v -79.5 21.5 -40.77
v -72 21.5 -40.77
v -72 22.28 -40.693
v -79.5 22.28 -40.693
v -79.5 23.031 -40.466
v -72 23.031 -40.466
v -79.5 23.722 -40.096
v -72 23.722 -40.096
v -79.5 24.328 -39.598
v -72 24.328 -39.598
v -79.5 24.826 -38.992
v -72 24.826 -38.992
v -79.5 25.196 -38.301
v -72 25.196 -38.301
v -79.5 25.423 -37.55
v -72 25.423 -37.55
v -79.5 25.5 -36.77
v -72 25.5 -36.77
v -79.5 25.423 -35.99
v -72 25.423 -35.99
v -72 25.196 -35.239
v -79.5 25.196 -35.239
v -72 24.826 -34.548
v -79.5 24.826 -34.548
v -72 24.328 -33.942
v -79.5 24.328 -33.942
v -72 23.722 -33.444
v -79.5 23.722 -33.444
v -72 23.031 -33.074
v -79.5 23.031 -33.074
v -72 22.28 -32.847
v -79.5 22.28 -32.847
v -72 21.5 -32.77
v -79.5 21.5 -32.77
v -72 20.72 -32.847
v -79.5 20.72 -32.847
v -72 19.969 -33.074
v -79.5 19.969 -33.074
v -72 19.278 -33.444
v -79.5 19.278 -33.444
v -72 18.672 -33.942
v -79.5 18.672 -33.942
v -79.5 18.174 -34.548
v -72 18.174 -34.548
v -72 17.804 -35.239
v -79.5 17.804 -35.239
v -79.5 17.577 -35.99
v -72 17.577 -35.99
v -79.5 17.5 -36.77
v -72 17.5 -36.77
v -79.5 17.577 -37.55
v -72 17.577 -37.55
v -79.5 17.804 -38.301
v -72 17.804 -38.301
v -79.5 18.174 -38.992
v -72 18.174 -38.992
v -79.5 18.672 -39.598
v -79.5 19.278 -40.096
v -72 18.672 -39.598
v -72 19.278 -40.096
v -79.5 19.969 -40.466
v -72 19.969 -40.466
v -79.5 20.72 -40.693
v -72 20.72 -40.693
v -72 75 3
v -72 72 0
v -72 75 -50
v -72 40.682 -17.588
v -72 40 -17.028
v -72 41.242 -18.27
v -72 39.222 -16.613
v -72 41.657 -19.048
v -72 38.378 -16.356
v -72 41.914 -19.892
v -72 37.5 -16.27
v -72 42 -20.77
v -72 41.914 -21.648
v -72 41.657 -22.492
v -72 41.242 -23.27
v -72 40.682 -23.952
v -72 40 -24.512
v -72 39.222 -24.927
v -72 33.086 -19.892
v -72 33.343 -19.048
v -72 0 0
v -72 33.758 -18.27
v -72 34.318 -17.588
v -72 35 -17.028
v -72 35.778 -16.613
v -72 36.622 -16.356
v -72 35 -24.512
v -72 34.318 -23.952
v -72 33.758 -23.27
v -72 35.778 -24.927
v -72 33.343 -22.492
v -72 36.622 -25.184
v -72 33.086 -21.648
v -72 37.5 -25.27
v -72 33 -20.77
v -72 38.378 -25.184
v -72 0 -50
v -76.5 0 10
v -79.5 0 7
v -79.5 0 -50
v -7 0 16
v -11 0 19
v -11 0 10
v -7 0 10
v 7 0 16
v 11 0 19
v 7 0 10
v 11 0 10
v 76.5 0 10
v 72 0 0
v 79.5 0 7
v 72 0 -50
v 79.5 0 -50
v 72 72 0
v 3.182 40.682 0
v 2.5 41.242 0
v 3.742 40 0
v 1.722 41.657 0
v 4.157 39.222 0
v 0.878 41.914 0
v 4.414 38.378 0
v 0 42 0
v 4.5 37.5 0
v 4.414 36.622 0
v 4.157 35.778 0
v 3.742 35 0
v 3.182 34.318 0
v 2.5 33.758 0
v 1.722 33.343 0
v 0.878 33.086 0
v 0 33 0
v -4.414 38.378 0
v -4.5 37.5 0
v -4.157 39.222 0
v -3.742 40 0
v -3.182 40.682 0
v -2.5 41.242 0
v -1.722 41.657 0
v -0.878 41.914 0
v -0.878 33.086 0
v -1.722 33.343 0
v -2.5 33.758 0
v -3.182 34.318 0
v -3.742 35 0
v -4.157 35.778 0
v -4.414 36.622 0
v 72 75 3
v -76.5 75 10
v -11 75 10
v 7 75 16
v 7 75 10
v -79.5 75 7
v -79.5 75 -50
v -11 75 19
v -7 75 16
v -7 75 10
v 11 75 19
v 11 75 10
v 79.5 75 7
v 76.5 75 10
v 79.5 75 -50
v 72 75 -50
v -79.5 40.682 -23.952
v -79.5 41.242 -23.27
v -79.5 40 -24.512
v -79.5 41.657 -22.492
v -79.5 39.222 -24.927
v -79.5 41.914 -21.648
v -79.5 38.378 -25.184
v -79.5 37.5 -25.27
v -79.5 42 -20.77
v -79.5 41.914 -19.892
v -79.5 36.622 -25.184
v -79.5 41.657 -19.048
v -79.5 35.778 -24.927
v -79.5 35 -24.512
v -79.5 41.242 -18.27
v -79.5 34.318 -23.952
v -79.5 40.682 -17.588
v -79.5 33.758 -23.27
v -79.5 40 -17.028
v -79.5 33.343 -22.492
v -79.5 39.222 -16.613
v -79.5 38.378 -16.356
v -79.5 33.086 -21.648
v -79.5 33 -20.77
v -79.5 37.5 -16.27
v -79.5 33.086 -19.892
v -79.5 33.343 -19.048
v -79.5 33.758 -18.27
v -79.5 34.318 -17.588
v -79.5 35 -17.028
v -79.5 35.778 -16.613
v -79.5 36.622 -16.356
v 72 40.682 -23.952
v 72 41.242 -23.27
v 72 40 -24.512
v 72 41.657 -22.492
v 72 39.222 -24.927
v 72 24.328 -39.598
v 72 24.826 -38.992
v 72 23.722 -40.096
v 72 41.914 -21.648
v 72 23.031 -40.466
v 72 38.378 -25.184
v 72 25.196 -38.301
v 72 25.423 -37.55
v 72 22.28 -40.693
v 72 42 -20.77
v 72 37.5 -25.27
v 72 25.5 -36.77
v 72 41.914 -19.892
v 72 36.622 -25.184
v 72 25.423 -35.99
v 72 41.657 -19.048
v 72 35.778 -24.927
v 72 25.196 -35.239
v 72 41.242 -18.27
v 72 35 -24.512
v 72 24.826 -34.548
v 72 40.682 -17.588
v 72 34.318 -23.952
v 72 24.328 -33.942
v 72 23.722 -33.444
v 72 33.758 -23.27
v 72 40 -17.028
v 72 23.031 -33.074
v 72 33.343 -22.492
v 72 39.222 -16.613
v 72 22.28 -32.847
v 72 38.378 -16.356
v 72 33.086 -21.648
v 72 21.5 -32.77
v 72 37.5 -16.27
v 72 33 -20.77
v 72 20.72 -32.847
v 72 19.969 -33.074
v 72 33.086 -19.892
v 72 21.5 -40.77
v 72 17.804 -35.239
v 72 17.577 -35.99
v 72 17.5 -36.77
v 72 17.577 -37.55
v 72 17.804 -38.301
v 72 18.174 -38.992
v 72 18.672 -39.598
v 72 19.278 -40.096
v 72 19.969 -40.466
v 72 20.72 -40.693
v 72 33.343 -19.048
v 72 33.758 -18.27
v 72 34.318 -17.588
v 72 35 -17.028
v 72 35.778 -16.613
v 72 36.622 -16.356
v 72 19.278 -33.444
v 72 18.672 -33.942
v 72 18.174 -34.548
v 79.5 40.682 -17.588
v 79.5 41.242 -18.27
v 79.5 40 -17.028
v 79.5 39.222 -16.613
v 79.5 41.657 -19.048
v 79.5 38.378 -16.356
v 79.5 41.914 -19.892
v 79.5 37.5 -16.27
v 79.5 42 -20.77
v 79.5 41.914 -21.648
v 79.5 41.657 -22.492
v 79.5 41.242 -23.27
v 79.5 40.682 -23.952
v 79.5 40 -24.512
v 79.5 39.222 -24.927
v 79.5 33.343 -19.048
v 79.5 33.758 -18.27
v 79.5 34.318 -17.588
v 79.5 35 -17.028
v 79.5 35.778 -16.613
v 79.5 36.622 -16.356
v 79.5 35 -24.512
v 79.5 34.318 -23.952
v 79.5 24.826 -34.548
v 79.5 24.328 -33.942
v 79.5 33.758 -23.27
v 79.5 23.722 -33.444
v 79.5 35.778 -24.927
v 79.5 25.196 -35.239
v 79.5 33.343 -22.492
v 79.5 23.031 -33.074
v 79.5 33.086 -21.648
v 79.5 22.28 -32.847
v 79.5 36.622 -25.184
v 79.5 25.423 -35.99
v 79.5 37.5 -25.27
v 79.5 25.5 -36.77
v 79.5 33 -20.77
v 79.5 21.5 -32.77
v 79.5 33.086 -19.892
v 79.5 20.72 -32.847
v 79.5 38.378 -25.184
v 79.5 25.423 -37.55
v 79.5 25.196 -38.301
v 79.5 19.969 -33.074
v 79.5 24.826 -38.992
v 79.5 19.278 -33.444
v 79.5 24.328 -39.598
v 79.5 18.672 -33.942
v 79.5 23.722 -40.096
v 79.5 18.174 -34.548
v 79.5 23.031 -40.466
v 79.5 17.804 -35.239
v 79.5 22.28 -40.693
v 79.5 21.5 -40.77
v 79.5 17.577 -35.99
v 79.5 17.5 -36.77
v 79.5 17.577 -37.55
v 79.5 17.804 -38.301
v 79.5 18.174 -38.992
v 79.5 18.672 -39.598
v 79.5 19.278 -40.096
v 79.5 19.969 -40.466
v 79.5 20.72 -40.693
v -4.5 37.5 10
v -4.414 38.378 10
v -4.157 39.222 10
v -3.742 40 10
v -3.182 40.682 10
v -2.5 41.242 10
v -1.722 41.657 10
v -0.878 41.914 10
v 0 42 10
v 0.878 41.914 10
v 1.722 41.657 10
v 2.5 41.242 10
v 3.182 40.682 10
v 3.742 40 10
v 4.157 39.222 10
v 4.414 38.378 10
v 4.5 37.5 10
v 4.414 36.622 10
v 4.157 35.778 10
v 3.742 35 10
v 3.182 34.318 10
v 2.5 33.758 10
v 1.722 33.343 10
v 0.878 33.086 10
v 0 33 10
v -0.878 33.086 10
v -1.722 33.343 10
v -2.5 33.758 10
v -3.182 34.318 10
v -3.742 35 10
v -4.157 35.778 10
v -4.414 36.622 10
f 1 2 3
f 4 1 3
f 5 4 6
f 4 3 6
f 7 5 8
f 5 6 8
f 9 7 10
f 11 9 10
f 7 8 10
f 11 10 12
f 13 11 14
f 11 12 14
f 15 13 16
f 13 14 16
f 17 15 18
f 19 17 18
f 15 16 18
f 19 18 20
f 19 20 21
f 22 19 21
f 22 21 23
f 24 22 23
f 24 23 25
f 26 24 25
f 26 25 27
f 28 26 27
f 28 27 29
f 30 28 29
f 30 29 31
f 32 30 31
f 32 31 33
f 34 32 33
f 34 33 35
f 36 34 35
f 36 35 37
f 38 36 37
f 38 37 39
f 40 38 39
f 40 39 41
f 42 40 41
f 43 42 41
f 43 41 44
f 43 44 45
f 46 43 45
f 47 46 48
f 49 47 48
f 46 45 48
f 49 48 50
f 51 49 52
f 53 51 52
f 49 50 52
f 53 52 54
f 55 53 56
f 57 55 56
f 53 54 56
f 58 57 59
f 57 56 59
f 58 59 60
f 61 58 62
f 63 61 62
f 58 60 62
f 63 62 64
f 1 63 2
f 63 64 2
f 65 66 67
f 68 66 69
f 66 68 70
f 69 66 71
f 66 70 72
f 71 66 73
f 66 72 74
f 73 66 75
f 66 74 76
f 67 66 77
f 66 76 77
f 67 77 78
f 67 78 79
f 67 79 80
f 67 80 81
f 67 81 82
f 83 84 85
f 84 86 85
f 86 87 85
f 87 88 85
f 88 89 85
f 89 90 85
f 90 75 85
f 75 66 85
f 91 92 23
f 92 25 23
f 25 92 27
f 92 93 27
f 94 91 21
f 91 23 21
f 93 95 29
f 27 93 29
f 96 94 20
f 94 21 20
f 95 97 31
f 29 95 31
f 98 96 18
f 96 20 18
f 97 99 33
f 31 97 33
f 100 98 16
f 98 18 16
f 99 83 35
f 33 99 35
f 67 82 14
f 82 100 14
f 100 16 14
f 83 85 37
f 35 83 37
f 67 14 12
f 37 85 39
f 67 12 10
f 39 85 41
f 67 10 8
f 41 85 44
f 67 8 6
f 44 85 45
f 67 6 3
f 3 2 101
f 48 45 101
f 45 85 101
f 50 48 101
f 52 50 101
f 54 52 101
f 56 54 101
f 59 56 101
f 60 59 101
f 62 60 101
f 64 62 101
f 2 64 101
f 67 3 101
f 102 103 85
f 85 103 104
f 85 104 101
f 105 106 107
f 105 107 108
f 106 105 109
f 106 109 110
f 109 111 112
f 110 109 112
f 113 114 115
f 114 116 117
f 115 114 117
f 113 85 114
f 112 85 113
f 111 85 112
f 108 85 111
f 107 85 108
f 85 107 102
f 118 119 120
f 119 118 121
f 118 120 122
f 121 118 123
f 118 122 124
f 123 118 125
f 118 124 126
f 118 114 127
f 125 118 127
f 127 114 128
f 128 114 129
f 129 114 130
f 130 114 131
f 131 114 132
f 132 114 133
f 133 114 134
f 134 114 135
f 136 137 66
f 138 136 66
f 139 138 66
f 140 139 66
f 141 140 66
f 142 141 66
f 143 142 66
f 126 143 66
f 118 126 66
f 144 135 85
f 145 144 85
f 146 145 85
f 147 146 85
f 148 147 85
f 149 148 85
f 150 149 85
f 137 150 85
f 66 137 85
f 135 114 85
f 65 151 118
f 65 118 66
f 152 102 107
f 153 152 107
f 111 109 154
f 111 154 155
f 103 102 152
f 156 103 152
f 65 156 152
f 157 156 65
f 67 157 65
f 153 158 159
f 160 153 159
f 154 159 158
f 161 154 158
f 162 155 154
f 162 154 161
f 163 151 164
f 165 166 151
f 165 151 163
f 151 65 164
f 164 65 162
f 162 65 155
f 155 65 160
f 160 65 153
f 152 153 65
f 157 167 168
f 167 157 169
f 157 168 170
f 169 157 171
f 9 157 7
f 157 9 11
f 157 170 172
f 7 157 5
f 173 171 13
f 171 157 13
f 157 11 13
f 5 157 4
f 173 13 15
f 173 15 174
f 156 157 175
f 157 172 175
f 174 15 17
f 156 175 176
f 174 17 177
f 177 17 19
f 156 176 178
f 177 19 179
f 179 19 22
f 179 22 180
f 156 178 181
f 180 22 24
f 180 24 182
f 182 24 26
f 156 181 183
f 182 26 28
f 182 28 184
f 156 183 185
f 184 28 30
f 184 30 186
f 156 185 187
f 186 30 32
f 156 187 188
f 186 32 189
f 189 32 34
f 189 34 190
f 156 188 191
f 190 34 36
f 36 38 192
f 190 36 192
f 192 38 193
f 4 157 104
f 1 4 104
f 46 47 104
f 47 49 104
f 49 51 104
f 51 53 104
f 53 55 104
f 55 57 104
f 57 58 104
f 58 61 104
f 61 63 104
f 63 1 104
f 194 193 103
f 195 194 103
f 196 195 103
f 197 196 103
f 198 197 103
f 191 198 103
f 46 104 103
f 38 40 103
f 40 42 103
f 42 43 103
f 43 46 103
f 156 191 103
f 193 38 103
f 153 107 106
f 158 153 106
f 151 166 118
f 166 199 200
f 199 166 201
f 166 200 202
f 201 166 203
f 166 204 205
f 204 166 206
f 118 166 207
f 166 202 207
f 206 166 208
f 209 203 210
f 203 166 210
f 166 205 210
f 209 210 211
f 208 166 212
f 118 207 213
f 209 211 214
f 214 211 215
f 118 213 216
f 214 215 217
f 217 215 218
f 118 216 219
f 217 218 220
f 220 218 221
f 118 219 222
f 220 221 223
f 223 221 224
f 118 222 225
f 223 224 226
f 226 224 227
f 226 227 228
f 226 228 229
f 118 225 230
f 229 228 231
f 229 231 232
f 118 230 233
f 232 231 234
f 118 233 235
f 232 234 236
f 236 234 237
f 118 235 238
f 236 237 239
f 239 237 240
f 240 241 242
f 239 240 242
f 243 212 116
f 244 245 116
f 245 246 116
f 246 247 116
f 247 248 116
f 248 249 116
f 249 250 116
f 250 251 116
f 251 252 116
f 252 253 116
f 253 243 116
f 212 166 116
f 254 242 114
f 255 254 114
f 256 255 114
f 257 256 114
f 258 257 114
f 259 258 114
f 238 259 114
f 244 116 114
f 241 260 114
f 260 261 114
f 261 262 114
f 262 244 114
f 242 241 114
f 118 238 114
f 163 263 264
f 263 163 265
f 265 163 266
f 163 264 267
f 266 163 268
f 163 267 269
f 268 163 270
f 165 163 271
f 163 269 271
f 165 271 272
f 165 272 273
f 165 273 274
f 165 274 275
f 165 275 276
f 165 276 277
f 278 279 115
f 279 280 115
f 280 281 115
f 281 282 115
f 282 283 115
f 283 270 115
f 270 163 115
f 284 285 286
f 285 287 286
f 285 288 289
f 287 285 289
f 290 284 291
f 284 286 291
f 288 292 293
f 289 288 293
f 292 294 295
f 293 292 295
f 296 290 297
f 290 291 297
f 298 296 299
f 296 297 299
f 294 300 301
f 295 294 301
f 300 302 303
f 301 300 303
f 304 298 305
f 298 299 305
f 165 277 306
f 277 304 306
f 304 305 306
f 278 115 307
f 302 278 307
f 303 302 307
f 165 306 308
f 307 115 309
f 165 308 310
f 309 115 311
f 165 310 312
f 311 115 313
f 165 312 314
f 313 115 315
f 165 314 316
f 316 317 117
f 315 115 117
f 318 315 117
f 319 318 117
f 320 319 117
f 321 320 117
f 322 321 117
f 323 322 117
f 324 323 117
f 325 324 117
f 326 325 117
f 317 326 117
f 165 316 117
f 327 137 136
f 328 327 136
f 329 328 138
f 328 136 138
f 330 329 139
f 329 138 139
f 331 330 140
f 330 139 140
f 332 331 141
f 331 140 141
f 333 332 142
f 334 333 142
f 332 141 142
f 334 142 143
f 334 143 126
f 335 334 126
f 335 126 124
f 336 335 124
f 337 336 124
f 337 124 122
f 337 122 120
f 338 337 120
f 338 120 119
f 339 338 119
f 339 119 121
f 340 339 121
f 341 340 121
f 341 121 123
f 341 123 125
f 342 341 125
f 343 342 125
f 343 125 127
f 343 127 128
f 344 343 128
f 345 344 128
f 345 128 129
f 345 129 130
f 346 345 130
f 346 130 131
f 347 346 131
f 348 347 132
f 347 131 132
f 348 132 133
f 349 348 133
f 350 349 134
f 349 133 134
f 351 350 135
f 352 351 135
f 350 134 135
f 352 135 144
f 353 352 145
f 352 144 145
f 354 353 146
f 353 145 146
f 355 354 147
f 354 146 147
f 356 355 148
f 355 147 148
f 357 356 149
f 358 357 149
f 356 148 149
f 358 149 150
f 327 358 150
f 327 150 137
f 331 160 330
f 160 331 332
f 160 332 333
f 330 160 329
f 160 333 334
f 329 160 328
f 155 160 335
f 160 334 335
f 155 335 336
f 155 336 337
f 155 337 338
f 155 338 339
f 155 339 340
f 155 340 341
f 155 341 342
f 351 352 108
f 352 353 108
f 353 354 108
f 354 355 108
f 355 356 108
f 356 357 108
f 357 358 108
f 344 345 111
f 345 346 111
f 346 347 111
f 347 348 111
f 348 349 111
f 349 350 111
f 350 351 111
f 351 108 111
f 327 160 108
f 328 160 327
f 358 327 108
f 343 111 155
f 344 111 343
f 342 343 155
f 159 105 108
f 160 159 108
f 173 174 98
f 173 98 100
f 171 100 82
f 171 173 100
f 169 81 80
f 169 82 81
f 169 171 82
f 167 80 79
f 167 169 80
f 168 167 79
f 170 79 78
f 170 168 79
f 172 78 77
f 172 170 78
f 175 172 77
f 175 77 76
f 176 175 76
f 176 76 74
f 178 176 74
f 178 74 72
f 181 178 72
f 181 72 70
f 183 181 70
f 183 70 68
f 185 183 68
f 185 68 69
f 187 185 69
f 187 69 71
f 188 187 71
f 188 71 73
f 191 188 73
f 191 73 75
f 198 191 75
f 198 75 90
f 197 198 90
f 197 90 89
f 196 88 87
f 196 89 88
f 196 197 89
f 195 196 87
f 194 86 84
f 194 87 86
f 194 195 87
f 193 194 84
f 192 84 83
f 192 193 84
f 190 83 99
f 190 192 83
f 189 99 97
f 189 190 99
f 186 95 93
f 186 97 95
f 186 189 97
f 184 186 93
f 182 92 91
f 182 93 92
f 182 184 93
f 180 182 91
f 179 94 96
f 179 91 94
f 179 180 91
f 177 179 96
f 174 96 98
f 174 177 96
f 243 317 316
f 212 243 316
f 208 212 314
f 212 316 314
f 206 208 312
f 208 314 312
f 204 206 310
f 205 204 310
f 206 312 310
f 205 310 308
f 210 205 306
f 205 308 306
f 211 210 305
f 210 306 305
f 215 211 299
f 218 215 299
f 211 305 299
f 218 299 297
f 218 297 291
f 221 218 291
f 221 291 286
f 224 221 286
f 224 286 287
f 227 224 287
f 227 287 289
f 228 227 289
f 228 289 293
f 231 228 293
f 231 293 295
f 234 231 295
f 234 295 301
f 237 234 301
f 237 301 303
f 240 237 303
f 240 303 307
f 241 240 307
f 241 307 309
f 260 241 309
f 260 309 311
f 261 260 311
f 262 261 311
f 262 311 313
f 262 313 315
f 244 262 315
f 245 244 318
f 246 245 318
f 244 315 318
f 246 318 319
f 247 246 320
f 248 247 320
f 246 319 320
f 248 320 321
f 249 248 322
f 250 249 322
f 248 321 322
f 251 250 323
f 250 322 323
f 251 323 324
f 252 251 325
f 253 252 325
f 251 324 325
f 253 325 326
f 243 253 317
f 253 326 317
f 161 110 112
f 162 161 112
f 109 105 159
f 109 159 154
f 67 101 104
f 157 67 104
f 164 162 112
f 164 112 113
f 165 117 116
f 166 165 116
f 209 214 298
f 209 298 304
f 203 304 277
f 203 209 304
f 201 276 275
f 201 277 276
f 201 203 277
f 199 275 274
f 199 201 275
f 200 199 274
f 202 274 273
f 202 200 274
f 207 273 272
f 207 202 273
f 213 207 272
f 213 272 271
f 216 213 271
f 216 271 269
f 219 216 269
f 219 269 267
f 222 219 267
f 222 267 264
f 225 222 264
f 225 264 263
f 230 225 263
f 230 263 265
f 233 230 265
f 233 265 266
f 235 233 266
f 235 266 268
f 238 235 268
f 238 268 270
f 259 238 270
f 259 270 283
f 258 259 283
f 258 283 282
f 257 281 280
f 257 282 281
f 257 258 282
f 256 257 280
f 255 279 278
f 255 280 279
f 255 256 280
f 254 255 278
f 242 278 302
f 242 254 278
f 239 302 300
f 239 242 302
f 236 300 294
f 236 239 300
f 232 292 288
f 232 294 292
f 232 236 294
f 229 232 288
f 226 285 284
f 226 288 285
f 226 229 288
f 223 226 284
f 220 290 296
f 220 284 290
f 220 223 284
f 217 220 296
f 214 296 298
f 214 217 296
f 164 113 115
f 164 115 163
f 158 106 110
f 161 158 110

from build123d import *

# Parameters (mm, degrees)
SKETCH1_W               = 14
SKETCH1_H               = 6
BOSS_EXTRUDE1_DEPTH     = 75
SKETCH2_R               = 4.5
CUT_EXTRUDE1_DEPTH      = 16
CUT_EXTRUDE2_DEPTH      = 177.287407378
CUT_EXTRUDE2_DEPTH_BACK = 177.287407378
SKETCH3_R               = 4.5
CHAMFER1_SIZE           = 3
SKETCH4_R               = 4
CUT_EXTRUDE3_DEPTH      = 183.773083357


with BuildPart() as part:
    # Sketch1 → Boss-Extrude1 (new body)
    with BuildSketch(Plane(origin=(0, 0, 0), x_dir=(1, 0, 0), z_dir=(0, 1, 0))):
        Polygon((72, 0), (-72, 0), (-72, 50), (-79.5, 50), (-79.5, -10), (-11, -10), (-11, -19), (11, -19), (11, -10), (79.5, -10), (79.5, 50), (72, 50), align=None)
        with Locations((0, -13)):
            Rectangle(SKETCH1_W, SKETCH1_H, mode=Mode.SUBTRACT)
    extrude(amount=BOSS_EXTRUDE1_DEPTH)

    # Sketch2 → Cut-Extrude1 (cut)
    with BuildSketch(Plane(origin=(0, 0, 0), x_dir=(-1, 0, 0), z_dir=(0, 0, -1))):
        with Locations((0, 37.5)):
            Circle(SKETCH2_R)
    extrude(amount=-CUT_EXTRUDE1_DEPTH, mode=Mode.SUBTRACT)

    # Sketch3 → Cut-Extrude2 (cut, two sides: drawn at the far end of the back side and taken through both)
    with BuildSketch(Plane(origin=(-72, 0, 0), x_dir=(0, 0, -1), z_dir=(1, 0, 0)).offset(-CUT_EXTRUDE2_DEPTH_BACK)):
        with Locations((20.77, 37.5)):
            Circle(SKETCH3_R)
    extrude(amount=CUT_EXTRUDE2_DEPTH + CUT_EXTRUDE2_DEPTH_BACK, mode=Mode.SUBTRACT)

    # Chamfer1
    chamfer1_edges = [part.edges().sort_by_distance(p)[0] for p in [
        (79.5, 37.5, 10),
        (-79.5, 37.5, 10),
        (0, 75, 0),
    ]]
    chamfer(chamfer1_edges, length=CHAMFER1_SIZE)

    # Sketch4 → Cut-Extrude3 (cut, through all)
    with BuildSketch(Plane(origin=(79.5, 0, 0), x_dir=(0, 0, -1), z_dir=(1, 0, 0))):
        with Locations((36.77, 21.5)):
            Circle(SKETCH4_R)
    extrude(amount=-CUT_EXTRUDE3_DEPTH, mode=Mode.SUBTRACT)


solid = part.part
